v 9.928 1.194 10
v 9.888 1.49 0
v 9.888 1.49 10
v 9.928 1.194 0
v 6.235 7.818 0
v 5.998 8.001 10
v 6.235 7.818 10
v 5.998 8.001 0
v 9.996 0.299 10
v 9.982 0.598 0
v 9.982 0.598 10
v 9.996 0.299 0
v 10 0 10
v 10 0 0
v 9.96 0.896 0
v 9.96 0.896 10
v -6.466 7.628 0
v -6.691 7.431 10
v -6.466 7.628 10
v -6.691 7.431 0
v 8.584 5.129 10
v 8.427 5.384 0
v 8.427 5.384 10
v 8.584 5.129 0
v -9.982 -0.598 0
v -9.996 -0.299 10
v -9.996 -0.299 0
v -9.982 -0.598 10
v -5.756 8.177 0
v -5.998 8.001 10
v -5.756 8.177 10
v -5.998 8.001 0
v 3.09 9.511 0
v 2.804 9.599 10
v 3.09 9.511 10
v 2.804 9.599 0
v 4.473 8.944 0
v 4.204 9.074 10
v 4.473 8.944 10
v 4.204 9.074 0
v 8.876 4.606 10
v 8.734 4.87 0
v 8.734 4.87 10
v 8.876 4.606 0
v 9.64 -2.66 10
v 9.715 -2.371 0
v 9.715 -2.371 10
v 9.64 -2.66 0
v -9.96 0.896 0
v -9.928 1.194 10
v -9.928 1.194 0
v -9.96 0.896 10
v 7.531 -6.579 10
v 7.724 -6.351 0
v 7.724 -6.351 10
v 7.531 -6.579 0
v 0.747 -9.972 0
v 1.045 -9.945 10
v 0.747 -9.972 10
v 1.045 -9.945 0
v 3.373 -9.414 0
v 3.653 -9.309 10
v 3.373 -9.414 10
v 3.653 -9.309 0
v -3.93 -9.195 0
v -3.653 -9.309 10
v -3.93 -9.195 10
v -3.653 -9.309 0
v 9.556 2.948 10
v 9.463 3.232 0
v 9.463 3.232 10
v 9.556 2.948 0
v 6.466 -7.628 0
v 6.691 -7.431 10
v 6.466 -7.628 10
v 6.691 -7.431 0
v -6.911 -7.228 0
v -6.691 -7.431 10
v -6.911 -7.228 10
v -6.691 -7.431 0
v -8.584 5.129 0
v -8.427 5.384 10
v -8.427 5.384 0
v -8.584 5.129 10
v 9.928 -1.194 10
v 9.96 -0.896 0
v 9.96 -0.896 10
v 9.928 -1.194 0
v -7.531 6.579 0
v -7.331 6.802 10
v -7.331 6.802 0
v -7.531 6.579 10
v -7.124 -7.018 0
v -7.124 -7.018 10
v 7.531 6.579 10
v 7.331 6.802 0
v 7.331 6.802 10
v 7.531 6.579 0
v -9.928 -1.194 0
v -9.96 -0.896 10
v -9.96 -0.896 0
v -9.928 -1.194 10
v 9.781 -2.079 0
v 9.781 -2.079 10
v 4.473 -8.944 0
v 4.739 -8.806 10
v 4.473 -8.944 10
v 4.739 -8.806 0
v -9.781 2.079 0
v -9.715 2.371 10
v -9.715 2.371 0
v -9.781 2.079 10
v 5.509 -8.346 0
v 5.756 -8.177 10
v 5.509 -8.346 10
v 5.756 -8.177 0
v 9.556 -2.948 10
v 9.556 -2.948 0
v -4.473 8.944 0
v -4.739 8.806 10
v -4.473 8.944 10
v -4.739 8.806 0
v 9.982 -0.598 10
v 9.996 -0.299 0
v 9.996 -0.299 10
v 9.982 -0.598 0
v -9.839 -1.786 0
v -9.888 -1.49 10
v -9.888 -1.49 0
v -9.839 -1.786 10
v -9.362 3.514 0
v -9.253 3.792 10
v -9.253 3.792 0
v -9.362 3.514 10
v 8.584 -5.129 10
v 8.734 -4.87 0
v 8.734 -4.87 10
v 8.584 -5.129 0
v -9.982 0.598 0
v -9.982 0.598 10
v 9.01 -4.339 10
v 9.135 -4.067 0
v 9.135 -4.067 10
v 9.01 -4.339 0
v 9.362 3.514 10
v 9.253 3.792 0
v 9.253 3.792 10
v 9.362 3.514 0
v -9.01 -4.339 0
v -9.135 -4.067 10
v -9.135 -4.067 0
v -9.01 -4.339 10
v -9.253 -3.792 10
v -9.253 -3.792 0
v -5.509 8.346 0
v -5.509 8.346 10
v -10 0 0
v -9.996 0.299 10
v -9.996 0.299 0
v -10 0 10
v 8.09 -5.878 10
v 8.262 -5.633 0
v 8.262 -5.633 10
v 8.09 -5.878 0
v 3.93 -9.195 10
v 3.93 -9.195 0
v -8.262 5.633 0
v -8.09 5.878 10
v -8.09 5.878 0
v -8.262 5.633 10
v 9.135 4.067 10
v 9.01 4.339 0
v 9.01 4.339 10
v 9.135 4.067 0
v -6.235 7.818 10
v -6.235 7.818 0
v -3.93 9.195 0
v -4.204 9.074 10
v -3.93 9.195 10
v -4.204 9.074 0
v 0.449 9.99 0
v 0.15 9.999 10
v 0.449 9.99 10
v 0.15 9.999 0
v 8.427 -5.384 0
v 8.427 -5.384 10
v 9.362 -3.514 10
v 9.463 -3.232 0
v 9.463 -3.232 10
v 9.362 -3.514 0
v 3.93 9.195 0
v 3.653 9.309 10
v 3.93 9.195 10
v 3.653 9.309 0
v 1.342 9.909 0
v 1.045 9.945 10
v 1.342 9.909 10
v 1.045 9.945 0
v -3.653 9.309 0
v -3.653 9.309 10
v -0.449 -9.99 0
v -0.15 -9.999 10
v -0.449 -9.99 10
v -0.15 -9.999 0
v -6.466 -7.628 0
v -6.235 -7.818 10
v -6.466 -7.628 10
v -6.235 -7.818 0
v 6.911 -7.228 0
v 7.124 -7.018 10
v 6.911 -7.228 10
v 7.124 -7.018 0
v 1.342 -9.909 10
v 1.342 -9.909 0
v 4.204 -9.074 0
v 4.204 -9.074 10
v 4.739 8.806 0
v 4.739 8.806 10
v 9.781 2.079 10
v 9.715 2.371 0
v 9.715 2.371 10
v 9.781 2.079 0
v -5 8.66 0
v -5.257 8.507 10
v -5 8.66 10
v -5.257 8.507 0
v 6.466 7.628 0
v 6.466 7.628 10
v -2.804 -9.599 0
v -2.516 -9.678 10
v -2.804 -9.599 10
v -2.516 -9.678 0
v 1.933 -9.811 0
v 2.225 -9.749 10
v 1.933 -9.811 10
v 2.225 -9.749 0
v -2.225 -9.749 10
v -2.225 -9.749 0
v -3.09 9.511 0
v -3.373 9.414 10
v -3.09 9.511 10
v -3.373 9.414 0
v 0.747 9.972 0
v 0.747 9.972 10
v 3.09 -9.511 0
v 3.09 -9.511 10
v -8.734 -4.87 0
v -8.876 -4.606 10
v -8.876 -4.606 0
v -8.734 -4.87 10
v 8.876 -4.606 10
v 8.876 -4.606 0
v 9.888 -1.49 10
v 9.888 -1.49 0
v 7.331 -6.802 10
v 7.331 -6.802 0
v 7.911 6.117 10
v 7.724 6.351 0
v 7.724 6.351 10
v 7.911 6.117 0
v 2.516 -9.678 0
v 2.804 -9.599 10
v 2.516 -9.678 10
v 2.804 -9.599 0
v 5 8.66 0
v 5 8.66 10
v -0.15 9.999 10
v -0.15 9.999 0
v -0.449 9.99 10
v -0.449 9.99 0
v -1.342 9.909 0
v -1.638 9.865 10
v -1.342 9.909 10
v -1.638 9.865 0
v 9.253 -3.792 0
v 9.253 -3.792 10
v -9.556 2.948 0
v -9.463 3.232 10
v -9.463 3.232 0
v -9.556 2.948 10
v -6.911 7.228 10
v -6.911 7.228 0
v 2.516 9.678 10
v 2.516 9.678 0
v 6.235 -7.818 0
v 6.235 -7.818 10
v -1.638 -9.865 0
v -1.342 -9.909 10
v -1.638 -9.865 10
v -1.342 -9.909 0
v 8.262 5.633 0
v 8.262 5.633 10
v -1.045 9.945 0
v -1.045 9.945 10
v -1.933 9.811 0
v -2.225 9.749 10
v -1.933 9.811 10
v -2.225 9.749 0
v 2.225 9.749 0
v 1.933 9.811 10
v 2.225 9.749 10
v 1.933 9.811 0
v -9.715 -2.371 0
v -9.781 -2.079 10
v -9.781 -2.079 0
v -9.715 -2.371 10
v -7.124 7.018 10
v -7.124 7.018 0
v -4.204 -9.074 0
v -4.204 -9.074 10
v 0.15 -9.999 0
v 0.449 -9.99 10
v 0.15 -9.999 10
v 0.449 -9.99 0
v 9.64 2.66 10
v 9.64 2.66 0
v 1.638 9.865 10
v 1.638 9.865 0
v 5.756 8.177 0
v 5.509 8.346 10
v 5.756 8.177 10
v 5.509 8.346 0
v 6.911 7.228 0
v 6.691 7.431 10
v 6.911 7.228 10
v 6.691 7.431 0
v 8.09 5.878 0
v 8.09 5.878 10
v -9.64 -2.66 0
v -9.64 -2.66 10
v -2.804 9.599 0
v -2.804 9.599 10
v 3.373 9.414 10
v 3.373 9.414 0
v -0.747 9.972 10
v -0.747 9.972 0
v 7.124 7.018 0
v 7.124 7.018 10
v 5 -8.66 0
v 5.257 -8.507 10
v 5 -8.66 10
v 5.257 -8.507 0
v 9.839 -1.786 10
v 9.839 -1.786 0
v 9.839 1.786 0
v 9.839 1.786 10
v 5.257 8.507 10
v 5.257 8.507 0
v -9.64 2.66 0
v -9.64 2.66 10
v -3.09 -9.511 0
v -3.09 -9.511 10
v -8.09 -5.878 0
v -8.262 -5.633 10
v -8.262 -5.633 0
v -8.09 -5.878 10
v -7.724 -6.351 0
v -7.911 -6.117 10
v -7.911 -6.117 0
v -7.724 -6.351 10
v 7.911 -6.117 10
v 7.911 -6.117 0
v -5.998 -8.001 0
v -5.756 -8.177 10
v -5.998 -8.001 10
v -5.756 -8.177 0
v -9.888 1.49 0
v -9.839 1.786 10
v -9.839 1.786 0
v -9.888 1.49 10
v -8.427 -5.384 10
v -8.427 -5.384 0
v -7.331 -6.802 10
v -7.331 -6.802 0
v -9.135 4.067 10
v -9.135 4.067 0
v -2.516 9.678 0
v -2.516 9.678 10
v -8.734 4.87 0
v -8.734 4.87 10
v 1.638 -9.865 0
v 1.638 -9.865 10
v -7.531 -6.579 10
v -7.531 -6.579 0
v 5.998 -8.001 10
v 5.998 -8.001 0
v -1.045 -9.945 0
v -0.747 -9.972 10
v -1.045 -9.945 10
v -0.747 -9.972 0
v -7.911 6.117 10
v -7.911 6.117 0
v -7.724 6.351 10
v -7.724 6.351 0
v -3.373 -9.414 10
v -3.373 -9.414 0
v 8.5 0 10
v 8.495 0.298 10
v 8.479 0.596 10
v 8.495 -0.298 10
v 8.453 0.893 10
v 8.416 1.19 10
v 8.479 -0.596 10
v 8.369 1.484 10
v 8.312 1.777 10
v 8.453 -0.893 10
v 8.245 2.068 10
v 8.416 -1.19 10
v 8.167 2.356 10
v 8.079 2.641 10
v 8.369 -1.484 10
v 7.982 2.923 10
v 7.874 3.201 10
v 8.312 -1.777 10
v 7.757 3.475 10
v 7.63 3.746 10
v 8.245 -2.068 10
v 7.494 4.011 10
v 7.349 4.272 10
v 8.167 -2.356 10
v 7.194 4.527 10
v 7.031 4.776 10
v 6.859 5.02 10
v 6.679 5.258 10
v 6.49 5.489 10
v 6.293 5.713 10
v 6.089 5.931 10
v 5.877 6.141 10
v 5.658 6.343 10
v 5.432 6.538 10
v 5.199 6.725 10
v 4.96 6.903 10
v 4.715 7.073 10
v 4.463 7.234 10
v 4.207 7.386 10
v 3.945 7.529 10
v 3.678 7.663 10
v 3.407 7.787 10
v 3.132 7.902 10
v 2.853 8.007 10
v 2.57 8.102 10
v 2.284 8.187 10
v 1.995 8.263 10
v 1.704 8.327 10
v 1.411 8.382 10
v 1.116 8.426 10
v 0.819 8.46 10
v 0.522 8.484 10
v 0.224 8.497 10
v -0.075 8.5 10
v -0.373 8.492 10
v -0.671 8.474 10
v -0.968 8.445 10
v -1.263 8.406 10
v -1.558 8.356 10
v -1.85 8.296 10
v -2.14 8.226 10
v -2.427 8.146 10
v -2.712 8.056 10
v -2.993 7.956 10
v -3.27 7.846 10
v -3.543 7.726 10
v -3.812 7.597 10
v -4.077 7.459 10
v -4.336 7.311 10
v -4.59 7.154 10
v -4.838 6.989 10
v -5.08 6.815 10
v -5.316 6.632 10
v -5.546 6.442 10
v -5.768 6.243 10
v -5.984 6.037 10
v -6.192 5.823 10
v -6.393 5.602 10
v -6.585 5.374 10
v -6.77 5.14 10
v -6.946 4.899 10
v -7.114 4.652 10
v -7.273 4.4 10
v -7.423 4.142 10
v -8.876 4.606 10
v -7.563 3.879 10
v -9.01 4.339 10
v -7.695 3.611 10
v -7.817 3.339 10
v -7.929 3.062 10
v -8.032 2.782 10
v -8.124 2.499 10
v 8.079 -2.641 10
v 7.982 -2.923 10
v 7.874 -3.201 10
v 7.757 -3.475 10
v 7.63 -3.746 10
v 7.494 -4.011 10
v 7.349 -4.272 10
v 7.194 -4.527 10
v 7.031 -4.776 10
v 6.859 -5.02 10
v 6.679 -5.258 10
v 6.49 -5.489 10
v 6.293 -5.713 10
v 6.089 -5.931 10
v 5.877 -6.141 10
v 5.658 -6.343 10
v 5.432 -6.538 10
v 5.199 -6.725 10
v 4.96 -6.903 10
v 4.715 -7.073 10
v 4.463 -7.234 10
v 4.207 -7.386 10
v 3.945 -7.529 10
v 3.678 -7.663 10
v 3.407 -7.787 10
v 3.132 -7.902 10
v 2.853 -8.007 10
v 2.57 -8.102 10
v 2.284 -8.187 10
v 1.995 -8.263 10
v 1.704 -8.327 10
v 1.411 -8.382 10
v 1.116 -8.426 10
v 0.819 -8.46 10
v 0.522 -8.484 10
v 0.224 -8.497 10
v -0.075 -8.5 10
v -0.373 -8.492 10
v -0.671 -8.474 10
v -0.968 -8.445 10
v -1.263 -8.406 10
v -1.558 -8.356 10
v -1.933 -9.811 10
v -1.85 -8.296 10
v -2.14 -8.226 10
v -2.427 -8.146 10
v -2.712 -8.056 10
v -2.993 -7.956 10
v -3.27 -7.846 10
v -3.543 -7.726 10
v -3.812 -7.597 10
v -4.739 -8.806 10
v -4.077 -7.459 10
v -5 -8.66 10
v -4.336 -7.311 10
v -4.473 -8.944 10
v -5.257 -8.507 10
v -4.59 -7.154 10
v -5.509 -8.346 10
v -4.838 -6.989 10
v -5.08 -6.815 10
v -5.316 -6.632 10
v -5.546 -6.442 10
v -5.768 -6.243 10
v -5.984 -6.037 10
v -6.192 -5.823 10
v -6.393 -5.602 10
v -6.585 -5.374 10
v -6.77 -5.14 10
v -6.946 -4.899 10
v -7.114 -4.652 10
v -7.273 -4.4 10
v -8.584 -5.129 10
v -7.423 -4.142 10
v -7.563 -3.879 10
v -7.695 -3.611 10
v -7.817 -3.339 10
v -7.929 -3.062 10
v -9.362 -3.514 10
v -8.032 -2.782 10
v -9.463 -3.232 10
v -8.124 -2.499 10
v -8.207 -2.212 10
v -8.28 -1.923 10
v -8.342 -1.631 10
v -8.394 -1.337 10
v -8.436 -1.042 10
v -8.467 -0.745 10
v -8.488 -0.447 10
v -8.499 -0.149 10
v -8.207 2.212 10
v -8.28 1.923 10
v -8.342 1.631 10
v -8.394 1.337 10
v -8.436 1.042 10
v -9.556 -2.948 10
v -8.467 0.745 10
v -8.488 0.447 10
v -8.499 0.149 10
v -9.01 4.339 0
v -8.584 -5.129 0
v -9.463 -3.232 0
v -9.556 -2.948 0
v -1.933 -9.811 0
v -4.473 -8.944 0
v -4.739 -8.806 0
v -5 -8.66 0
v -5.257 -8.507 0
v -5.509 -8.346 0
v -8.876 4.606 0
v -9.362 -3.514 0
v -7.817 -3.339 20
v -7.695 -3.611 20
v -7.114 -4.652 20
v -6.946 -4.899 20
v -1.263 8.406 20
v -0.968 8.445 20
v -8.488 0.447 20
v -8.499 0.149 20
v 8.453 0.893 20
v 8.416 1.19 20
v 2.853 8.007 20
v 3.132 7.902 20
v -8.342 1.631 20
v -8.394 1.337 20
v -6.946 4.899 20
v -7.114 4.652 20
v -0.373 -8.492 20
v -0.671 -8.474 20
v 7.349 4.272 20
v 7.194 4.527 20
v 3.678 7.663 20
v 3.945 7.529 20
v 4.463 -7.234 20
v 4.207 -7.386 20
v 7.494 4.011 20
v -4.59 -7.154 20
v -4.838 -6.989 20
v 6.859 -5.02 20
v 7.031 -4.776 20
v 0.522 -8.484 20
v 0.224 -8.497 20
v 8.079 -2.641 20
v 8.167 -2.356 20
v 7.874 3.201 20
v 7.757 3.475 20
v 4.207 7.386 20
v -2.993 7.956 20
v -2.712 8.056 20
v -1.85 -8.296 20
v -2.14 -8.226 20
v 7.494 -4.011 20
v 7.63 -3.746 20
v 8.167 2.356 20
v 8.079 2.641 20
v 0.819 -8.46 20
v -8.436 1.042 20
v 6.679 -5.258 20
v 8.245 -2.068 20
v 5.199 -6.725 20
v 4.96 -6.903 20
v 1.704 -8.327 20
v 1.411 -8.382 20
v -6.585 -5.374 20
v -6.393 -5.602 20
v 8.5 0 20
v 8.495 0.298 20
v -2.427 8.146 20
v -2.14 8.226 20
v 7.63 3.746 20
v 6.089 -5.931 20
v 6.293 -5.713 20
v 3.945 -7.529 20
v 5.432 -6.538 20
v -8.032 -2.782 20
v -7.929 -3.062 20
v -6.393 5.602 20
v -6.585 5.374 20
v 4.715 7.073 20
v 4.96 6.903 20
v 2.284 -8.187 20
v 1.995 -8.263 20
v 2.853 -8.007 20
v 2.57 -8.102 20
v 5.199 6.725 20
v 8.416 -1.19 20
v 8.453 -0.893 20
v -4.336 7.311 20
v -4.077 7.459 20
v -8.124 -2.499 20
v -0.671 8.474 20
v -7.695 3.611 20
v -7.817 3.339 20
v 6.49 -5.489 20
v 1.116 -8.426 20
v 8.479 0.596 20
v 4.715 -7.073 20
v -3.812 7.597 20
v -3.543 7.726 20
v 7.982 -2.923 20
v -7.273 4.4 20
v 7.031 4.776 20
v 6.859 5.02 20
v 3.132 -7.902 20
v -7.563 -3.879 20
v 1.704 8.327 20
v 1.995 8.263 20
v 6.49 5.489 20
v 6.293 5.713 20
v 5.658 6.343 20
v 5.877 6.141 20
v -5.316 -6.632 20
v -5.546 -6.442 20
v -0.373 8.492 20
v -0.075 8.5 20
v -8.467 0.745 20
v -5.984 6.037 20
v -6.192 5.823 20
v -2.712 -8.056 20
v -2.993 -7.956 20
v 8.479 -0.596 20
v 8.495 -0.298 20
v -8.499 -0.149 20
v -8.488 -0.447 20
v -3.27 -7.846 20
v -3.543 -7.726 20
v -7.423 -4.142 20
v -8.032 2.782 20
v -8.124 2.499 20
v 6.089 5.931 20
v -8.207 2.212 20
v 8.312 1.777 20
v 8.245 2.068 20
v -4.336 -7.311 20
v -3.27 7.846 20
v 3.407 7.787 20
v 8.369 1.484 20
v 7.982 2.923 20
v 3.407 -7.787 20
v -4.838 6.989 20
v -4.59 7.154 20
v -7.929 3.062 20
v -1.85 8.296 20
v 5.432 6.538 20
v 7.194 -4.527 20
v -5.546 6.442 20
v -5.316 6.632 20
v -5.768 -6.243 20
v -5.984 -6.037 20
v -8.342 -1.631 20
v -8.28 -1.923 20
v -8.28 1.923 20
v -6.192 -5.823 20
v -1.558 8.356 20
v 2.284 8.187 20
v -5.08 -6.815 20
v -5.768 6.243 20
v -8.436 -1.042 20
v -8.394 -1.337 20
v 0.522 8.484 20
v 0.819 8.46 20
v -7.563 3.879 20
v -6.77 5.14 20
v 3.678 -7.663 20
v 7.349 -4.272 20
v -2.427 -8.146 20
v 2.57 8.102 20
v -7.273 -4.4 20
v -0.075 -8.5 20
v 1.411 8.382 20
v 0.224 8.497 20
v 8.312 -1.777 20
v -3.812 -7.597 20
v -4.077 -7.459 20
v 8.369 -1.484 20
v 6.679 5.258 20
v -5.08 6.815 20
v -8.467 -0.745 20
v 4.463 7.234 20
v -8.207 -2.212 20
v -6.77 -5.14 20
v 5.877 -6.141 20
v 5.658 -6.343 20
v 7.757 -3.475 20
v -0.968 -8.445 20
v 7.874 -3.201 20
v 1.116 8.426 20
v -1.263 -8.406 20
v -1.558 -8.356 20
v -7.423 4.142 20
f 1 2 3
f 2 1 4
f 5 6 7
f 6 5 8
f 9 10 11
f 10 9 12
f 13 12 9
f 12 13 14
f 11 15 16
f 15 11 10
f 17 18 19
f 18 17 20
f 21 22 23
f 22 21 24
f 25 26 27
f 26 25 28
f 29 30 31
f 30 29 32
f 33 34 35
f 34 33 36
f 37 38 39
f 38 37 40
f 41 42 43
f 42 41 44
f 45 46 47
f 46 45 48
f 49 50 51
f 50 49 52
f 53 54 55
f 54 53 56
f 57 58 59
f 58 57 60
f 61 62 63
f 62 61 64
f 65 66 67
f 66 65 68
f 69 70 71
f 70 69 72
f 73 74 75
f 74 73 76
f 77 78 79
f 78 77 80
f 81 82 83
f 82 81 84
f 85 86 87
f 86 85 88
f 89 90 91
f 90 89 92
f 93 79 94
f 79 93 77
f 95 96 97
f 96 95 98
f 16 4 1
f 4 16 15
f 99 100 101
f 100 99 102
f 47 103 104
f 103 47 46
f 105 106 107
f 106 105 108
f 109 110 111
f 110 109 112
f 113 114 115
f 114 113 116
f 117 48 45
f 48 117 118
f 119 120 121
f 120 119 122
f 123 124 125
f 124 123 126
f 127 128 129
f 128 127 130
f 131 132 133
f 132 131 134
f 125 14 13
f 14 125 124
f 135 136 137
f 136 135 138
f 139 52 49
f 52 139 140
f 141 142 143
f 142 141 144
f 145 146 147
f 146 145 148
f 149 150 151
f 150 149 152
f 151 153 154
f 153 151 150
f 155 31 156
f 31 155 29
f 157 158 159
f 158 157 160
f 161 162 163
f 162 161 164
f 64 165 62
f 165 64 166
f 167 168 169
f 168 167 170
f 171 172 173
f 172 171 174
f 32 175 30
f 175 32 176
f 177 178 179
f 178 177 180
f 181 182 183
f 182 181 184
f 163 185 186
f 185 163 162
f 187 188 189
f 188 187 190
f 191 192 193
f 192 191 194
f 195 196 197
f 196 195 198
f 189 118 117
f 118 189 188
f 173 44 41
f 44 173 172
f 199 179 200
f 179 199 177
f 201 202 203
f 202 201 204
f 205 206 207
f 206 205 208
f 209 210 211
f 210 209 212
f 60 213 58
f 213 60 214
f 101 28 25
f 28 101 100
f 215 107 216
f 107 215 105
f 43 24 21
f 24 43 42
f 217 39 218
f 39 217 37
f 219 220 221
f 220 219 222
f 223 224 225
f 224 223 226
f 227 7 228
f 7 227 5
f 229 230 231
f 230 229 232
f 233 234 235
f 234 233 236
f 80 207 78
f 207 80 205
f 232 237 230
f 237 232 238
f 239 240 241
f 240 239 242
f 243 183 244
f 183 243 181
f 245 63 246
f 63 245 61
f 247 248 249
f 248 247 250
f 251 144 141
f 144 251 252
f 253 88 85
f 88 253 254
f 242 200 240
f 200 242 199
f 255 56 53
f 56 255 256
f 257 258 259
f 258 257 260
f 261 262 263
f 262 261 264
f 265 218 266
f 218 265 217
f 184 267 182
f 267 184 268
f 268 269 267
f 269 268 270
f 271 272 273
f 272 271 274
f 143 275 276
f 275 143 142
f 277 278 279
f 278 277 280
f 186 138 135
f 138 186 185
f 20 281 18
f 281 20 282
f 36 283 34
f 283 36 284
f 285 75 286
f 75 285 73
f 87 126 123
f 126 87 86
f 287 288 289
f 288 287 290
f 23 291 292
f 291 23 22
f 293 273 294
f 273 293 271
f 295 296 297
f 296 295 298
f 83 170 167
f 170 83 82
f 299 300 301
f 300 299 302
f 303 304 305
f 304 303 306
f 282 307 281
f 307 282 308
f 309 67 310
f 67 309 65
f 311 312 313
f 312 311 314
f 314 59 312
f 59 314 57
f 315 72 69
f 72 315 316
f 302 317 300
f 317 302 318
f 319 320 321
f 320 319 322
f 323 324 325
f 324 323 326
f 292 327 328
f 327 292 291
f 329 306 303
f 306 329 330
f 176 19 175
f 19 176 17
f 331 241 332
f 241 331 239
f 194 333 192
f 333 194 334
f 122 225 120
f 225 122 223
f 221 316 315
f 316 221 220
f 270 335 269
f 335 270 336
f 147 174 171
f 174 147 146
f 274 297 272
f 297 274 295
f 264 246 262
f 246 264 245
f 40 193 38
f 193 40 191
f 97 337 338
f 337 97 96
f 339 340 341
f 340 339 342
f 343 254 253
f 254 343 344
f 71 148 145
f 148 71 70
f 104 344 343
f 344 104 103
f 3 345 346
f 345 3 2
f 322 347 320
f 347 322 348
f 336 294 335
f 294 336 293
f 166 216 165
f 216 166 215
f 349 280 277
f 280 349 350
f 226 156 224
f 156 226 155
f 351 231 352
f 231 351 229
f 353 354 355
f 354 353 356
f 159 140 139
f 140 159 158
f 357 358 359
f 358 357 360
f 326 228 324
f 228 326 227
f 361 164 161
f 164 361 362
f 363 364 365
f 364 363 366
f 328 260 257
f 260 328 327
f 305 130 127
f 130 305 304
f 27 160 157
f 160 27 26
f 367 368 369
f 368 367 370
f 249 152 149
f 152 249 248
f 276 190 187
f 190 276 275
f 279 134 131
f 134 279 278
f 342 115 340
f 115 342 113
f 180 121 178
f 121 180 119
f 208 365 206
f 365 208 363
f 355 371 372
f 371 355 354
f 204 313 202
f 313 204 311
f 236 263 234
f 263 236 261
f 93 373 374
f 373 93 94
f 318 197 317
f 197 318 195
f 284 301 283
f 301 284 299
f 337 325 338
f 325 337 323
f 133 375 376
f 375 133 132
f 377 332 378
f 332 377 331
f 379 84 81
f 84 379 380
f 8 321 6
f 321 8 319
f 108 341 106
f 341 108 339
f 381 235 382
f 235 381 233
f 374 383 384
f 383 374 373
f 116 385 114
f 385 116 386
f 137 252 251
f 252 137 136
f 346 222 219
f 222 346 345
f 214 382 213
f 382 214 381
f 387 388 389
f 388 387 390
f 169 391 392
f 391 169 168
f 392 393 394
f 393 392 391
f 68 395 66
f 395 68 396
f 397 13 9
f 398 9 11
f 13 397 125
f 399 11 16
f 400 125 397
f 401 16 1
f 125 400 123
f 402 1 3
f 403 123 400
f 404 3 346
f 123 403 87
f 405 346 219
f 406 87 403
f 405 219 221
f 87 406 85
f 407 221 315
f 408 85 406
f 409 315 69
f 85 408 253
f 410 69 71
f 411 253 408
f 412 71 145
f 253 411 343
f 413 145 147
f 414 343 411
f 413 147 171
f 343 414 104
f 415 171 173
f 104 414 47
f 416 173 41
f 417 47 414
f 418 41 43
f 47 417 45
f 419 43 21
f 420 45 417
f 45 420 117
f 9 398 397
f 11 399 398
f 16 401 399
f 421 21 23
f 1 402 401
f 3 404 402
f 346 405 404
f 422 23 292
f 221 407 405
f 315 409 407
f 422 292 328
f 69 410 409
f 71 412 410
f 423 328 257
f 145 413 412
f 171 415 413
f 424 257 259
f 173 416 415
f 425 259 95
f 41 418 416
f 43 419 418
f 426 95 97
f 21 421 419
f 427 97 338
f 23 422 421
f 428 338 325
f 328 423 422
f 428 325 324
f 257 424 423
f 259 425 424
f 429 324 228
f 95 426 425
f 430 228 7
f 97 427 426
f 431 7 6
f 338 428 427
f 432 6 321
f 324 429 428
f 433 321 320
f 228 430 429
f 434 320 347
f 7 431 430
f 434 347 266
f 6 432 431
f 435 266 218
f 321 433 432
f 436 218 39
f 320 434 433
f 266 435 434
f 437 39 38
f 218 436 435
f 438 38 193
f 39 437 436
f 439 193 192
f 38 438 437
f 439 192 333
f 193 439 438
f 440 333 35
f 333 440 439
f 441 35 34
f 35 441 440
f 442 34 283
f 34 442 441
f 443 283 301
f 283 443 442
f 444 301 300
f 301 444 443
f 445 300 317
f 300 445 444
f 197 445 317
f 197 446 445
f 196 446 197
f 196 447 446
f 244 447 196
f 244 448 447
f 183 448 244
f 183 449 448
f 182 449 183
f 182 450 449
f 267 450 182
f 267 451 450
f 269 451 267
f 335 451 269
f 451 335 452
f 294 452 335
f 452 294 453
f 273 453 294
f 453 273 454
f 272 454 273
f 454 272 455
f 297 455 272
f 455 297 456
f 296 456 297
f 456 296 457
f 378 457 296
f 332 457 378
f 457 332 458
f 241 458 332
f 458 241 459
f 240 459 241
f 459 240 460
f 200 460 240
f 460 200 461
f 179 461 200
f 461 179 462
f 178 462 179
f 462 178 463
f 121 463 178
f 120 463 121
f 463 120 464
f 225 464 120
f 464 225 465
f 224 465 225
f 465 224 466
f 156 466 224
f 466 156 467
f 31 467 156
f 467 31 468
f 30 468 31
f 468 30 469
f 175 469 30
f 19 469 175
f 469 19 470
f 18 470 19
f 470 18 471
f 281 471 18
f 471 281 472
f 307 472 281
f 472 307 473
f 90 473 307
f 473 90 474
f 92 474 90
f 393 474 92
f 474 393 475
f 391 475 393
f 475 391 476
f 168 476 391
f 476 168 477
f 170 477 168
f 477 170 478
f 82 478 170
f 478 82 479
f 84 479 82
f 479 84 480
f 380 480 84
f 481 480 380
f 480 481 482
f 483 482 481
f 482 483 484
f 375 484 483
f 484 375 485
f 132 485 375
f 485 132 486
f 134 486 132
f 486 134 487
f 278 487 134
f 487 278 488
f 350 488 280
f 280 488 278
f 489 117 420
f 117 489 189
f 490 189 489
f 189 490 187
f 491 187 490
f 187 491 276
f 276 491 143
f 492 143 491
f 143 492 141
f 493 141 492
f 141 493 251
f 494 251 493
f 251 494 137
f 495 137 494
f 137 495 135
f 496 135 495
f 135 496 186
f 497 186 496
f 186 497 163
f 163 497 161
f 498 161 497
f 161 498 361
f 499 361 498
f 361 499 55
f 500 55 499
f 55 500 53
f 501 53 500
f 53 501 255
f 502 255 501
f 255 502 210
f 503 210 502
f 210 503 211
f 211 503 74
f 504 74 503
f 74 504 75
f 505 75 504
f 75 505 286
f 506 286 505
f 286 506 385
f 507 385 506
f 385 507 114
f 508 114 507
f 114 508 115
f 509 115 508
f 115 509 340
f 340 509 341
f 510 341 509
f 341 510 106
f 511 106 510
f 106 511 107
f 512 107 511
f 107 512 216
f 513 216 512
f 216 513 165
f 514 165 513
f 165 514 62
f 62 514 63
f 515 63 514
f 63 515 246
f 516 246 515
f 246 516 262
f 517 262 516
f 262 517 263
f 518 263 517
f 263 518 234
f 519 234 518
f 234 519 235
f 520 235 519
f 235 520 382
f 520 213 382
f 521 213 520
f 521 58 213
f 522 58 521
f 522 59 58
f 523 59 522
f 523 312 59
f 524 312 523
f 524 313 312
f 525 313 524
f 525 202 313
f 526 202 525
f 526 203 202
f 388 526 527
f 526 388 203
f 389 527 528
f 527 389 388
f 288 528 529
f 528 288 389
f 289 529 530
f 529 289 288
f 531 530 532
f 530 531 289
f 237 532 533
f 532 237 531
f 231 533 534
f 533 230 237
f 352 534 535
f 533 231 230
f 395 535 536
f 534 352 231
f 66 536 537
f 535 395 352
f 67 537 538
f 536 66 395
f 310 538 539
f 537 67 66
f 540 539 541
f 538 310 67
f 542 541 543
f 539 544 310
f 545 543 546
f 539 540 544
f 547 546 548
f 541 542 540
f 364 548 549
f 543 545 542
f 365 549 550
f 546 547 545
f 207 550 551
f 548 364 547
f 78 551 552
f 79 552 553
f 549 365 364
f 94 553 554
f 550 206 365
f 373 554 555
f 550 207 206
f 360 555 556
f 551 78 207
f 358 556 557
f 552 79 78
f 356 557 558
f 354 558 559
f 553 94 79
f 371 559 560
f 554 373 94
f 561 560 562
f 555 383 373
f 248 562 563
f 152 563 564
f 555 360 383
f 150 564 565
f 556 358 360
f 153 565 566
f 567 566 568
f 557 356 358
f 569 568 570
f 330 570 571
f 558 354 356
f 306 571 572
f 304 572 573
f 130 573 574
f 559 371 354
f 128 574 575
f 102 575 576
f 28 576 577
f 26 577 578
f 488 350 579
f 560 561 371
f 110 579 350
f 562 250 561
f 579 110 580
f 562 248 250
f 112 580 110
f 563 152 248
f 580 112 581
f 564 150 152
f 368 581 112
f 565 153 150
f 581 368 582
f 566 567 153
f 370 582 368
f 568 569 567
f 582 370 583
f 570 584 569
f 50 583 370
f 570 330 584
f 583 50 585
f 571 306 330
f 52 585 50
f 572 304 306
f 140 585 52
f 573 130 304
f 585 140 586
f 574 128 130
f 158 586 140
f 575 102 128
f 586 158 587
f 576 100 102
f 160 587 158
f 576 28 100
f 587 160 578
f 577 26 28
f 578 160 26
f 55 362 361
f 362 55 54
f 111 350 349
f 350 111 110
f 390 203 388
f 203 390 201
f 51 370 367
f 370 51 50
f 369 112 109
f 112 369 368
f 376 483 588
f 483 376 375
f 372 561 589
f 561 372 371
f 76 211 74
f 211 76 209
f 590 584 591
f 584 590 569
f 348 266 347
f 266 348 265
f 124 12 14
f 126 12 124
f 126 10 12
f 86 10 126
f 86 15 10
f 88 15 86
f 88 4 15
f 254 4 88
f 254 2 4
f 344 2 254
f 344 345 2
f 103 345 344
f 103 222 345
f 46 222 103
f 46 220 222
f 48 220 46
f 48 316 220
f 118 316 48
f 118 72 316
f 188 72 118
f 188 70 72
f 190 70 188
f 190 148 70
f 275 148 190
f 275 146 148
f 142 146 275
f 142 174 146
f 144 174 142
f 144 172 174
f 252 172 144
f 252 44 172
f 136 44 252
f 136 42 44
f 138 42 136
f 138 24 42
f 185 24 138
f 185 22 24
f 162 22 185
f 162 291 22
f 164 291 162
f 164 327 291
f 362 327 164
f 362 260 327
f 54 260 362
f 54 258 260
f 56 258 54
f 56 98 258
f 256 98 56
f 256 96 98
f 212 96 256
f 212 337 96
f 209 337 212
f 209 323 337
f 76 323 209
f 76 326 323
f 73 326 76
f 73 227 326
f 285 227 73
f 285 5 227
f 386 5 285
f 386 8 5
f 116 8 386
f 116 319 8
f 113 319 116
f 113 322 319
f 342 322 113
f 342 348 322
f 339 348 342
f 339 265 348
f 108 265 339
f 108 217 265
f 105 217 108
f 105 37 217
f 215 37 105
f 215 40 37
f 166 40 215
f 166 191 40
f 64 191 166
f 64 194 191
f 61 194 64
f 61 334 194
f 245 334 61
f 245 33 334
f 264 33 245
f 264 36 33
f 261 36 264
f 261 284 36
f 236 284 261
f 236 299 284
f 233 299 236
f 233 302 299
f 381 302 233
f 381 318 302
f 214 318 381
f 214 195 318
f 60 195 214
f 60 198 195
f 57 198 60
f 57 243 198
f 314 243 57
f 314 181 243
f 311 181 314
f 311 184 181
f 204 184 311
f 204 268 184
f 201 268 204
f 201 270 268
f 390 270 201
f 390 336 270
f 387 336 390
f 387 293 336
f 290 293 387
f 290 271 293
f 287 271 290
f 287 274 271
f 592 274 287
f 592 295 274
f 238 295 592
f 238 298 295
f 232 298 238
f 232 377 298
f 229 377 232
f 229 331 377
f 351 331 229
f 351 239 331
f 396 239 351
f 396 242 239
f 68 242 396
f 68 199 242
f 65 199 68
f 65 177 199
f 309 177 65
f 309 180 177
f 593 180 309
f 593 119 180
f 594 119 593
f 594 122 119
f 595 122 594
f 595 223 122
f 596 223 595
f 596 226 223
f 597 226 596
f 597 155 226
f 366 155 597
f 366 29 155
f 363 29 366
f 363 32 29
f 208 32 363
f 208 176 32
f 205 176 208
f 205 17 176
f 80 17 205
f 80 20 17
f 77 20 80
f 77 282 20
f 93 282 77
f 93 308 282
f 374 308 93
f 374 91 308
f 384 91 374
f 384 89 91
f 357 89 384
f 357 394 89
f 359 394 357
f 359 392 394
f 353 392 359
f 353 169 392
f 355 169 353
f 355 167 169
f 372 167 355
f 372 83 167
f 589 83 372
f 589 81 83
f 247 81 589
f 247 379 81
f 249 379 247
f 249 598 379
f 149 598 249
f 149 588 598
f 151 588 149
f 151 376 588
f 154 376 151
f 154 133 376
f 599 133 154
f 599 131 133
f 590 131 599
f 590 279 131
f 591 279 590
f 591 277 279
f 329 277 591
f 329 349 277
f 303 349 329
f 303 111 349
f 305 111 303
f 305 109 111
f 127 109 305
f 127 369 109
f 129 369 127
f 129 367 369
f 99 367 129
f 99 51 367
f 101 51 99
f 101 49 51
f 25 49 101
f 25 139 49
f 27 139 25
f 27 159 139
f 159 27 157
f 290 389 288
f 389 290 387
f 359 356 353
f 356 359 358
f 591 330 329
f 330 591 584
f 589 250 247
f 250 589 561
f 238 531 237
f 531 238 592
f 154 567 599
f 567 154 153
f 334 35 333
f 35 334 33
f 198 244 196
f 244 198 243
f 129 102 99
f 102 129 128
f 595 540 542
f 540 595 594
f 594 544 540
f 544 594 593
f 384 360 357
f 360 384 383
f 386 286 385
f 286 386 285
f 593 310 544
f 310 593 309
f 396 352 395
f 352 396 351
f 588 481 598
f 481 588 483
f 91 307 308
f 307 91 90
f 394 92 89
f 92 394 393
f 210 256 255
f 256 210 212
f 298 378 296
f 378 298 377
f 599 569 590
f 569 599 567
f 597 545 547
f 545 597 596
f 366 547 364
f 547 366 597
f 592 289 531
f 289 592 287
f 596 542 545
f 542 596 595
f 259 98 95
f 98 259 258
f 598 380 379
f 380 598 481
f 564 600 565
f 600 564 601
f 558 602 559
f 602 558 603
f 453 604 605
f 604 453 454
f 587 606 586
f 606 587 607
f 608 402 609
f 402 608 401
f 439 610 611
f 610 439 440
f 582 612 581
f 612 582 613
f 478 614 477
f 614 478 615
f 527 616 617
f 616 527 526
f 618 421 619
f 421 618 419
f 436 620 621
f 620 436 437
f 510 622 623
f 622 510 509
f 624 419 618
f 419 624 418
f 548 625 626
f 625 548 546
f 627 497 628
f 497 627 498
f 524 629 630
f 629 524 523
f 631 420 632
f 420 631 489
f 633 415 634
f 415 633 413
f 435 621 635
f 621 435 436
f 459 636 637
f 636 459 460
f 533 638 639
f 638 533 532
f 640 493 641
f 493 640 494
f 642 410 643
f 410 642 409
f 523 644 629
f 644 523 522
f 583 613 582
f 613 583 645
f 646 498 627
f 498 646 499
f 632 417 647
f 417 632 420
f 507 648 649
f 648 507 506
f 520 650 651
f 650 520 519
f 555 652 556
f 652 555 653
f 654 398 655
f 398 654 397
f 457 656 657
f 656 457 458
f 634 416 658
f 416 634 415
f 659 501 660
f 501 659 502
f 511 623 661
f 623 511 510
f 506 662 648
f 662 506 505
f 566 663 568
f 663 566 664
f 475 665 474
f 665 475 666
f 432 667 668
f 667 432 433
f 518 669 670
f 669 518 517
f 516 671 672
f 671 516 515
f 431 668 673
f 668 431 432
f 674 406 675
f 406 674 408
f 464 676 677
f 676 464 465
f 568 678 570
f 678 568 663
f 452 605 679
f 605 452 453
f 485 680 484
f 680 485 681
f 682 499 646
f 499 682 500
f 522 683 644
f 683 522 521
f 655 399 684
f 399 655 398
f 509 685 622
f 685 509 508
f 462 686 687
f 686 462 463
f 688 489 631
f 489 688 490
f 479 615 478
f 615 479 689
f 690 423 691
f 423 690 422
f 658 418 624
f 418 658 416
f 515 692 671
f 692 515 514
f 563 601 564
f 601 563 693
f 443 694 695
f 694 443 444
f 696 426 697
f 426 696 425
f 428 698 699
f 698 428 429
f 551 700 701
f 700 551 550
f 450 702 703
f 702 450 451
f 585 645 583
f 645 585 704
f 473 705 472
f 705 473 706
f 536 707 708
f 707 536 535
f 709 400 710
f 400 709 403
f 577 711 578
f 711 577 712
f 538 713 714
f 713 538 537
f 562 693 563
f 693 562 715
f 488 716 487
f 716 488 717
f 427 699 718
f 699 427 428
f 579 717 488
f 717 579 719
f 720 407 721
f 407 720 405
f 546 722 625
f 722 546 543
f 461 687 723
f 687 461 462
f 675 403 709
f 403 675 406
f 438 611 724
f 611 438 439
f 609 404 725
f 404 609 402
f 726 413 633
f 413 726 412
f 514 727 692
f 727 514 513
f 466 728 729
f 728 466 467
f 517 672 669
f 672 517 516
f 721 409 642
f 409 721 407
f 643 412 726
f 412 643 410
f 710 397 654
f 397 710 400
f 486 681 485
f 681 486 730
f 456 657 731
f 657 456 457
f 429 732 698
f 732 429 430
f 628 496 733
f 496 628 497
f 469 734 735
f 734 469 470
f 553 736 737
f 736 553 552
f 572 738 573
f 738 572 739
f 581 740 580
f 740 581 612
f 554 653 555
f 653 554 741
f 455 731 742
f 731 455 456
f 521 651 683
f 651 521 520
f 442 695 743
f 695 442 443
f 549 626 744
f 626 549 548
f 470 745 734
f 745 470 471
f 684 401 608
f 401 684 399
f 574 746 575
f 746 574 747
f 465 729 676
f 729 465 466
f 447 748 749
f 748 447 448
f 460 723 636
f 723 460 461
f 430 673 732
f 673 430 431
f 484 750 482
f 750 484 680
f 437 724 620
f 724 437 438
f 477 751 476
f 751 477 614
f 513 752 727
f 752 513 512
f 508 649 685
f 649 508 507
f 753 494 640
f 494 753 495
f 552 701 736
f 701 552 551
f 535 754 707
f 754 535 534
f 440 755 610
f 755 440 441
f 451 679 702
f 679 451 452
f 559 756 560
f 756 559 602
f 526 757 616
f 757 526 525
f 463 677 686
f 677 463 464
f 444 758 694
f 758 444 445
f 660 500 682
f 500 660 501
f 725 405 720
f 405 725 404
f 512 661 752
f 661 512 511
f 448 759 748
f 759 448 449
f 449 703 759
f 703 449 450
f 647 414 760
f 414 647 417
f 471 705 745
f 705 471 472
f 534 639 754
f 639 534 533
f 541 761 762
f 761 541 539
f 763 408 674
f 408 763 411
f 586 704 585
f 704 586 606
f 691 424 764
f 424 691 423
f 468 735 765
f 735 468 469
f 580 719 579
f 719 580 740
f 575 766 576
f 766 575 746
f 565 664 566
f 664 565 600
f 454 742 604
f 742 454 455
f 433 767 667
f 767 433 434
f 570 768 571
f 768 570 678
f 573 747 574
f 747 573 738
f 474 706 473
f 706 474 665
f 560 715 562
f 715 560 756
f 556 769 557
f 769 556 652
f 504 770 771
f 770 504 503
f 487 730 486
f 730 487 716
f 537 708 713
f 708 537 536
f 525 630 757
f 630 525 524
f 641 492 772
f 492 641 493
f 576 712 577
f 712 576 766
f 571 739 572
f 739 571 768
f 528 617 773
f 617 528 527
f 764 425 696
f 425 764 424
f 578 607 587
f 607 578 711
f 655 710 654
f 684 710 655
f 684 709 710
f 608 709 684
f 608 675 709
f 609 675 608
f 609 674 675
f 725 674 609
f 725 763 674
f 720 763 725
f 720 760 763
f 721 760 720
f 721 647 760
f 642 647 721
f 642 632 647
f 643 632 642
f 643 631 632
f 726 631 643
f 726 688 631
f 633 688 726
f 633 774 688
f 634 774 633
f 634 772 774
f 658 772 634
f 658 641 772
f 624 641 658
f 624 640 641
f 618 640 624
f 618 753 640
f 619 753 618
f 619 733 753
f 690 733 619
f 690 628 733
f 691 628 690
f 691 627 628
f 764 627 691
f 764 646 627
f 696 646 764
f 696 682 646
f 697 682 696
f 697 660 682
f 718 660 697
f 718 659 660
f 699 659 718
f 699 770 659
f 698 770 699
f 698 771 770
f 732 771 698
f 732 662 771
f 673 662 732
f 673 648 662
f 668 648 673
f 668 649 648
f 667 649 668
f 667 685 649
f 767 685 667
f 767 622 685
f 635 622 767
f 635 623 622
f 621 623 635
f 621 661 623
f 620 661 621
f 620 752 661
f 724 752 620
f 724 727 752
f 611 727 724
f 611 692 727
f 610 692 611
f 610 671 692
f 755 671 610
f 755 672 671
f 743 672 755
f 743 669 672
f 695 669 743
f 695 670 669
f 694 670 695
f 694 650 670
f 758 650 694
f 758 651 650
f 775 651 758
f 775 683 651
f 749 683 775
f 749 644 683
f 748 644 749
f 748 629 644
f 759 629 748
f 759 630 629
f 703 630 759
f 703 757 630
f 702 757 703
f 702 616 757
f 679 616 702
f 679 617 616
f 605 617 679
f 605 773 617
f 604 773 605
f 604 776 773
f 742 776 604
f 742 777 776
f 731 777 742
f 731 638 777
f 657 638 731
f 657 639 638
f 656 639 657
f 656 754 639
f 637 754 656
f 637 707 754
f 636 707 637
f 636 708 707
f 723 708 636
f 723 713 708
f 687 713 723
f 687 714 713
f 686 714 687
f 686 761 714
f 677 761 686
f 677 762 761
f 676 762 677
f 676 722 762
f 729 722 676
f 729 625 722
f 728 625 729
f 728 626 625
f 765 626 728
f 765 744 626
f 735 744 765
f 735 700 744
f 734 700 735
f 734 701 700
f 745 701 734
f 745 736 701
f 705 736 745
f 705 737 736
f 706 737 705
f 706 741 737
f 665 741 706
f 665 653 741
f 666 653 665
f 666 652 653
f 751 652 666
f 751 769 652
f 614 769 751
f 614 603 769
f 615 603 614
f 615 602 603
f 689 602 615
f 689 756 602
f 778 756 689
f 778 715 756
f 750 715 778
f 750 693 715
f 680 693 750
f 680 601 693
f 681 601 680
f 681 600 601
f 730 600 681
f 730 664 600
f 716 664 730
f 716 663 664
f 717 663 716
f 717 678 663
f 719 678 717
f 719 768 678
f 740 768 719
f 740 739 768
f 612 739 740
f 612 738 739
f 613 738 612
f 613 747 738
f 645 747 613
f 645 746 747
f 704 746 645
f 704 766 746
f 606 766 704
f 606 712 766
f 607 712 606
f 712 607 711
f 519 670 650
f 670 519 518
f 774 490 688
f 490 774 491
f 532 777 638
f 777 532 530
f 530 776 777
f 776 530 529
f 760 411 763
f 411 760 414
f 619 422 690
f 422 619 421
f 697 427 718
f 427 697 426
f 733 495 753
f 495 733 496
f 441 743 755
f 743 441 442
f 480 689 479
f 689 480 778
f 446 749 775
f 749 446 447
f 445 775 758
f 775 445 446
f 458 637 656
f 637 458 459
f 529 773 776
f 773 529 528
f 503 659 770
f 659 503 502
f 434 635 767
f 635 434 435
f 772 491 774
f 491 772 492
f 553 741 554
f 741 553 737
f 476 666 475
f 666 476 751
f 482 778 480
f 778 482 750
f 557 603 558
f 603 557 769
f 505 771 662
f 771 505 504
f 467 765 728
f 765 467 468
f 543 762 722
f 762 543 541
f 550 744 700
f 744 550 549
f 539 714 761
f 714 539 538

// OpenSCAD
$fs = 0.3;
$fa = 1;

cylinder(r=10, h=10);
translate([0, 0, 10]) {
	cylinder(r=8.5, h=10);
}
